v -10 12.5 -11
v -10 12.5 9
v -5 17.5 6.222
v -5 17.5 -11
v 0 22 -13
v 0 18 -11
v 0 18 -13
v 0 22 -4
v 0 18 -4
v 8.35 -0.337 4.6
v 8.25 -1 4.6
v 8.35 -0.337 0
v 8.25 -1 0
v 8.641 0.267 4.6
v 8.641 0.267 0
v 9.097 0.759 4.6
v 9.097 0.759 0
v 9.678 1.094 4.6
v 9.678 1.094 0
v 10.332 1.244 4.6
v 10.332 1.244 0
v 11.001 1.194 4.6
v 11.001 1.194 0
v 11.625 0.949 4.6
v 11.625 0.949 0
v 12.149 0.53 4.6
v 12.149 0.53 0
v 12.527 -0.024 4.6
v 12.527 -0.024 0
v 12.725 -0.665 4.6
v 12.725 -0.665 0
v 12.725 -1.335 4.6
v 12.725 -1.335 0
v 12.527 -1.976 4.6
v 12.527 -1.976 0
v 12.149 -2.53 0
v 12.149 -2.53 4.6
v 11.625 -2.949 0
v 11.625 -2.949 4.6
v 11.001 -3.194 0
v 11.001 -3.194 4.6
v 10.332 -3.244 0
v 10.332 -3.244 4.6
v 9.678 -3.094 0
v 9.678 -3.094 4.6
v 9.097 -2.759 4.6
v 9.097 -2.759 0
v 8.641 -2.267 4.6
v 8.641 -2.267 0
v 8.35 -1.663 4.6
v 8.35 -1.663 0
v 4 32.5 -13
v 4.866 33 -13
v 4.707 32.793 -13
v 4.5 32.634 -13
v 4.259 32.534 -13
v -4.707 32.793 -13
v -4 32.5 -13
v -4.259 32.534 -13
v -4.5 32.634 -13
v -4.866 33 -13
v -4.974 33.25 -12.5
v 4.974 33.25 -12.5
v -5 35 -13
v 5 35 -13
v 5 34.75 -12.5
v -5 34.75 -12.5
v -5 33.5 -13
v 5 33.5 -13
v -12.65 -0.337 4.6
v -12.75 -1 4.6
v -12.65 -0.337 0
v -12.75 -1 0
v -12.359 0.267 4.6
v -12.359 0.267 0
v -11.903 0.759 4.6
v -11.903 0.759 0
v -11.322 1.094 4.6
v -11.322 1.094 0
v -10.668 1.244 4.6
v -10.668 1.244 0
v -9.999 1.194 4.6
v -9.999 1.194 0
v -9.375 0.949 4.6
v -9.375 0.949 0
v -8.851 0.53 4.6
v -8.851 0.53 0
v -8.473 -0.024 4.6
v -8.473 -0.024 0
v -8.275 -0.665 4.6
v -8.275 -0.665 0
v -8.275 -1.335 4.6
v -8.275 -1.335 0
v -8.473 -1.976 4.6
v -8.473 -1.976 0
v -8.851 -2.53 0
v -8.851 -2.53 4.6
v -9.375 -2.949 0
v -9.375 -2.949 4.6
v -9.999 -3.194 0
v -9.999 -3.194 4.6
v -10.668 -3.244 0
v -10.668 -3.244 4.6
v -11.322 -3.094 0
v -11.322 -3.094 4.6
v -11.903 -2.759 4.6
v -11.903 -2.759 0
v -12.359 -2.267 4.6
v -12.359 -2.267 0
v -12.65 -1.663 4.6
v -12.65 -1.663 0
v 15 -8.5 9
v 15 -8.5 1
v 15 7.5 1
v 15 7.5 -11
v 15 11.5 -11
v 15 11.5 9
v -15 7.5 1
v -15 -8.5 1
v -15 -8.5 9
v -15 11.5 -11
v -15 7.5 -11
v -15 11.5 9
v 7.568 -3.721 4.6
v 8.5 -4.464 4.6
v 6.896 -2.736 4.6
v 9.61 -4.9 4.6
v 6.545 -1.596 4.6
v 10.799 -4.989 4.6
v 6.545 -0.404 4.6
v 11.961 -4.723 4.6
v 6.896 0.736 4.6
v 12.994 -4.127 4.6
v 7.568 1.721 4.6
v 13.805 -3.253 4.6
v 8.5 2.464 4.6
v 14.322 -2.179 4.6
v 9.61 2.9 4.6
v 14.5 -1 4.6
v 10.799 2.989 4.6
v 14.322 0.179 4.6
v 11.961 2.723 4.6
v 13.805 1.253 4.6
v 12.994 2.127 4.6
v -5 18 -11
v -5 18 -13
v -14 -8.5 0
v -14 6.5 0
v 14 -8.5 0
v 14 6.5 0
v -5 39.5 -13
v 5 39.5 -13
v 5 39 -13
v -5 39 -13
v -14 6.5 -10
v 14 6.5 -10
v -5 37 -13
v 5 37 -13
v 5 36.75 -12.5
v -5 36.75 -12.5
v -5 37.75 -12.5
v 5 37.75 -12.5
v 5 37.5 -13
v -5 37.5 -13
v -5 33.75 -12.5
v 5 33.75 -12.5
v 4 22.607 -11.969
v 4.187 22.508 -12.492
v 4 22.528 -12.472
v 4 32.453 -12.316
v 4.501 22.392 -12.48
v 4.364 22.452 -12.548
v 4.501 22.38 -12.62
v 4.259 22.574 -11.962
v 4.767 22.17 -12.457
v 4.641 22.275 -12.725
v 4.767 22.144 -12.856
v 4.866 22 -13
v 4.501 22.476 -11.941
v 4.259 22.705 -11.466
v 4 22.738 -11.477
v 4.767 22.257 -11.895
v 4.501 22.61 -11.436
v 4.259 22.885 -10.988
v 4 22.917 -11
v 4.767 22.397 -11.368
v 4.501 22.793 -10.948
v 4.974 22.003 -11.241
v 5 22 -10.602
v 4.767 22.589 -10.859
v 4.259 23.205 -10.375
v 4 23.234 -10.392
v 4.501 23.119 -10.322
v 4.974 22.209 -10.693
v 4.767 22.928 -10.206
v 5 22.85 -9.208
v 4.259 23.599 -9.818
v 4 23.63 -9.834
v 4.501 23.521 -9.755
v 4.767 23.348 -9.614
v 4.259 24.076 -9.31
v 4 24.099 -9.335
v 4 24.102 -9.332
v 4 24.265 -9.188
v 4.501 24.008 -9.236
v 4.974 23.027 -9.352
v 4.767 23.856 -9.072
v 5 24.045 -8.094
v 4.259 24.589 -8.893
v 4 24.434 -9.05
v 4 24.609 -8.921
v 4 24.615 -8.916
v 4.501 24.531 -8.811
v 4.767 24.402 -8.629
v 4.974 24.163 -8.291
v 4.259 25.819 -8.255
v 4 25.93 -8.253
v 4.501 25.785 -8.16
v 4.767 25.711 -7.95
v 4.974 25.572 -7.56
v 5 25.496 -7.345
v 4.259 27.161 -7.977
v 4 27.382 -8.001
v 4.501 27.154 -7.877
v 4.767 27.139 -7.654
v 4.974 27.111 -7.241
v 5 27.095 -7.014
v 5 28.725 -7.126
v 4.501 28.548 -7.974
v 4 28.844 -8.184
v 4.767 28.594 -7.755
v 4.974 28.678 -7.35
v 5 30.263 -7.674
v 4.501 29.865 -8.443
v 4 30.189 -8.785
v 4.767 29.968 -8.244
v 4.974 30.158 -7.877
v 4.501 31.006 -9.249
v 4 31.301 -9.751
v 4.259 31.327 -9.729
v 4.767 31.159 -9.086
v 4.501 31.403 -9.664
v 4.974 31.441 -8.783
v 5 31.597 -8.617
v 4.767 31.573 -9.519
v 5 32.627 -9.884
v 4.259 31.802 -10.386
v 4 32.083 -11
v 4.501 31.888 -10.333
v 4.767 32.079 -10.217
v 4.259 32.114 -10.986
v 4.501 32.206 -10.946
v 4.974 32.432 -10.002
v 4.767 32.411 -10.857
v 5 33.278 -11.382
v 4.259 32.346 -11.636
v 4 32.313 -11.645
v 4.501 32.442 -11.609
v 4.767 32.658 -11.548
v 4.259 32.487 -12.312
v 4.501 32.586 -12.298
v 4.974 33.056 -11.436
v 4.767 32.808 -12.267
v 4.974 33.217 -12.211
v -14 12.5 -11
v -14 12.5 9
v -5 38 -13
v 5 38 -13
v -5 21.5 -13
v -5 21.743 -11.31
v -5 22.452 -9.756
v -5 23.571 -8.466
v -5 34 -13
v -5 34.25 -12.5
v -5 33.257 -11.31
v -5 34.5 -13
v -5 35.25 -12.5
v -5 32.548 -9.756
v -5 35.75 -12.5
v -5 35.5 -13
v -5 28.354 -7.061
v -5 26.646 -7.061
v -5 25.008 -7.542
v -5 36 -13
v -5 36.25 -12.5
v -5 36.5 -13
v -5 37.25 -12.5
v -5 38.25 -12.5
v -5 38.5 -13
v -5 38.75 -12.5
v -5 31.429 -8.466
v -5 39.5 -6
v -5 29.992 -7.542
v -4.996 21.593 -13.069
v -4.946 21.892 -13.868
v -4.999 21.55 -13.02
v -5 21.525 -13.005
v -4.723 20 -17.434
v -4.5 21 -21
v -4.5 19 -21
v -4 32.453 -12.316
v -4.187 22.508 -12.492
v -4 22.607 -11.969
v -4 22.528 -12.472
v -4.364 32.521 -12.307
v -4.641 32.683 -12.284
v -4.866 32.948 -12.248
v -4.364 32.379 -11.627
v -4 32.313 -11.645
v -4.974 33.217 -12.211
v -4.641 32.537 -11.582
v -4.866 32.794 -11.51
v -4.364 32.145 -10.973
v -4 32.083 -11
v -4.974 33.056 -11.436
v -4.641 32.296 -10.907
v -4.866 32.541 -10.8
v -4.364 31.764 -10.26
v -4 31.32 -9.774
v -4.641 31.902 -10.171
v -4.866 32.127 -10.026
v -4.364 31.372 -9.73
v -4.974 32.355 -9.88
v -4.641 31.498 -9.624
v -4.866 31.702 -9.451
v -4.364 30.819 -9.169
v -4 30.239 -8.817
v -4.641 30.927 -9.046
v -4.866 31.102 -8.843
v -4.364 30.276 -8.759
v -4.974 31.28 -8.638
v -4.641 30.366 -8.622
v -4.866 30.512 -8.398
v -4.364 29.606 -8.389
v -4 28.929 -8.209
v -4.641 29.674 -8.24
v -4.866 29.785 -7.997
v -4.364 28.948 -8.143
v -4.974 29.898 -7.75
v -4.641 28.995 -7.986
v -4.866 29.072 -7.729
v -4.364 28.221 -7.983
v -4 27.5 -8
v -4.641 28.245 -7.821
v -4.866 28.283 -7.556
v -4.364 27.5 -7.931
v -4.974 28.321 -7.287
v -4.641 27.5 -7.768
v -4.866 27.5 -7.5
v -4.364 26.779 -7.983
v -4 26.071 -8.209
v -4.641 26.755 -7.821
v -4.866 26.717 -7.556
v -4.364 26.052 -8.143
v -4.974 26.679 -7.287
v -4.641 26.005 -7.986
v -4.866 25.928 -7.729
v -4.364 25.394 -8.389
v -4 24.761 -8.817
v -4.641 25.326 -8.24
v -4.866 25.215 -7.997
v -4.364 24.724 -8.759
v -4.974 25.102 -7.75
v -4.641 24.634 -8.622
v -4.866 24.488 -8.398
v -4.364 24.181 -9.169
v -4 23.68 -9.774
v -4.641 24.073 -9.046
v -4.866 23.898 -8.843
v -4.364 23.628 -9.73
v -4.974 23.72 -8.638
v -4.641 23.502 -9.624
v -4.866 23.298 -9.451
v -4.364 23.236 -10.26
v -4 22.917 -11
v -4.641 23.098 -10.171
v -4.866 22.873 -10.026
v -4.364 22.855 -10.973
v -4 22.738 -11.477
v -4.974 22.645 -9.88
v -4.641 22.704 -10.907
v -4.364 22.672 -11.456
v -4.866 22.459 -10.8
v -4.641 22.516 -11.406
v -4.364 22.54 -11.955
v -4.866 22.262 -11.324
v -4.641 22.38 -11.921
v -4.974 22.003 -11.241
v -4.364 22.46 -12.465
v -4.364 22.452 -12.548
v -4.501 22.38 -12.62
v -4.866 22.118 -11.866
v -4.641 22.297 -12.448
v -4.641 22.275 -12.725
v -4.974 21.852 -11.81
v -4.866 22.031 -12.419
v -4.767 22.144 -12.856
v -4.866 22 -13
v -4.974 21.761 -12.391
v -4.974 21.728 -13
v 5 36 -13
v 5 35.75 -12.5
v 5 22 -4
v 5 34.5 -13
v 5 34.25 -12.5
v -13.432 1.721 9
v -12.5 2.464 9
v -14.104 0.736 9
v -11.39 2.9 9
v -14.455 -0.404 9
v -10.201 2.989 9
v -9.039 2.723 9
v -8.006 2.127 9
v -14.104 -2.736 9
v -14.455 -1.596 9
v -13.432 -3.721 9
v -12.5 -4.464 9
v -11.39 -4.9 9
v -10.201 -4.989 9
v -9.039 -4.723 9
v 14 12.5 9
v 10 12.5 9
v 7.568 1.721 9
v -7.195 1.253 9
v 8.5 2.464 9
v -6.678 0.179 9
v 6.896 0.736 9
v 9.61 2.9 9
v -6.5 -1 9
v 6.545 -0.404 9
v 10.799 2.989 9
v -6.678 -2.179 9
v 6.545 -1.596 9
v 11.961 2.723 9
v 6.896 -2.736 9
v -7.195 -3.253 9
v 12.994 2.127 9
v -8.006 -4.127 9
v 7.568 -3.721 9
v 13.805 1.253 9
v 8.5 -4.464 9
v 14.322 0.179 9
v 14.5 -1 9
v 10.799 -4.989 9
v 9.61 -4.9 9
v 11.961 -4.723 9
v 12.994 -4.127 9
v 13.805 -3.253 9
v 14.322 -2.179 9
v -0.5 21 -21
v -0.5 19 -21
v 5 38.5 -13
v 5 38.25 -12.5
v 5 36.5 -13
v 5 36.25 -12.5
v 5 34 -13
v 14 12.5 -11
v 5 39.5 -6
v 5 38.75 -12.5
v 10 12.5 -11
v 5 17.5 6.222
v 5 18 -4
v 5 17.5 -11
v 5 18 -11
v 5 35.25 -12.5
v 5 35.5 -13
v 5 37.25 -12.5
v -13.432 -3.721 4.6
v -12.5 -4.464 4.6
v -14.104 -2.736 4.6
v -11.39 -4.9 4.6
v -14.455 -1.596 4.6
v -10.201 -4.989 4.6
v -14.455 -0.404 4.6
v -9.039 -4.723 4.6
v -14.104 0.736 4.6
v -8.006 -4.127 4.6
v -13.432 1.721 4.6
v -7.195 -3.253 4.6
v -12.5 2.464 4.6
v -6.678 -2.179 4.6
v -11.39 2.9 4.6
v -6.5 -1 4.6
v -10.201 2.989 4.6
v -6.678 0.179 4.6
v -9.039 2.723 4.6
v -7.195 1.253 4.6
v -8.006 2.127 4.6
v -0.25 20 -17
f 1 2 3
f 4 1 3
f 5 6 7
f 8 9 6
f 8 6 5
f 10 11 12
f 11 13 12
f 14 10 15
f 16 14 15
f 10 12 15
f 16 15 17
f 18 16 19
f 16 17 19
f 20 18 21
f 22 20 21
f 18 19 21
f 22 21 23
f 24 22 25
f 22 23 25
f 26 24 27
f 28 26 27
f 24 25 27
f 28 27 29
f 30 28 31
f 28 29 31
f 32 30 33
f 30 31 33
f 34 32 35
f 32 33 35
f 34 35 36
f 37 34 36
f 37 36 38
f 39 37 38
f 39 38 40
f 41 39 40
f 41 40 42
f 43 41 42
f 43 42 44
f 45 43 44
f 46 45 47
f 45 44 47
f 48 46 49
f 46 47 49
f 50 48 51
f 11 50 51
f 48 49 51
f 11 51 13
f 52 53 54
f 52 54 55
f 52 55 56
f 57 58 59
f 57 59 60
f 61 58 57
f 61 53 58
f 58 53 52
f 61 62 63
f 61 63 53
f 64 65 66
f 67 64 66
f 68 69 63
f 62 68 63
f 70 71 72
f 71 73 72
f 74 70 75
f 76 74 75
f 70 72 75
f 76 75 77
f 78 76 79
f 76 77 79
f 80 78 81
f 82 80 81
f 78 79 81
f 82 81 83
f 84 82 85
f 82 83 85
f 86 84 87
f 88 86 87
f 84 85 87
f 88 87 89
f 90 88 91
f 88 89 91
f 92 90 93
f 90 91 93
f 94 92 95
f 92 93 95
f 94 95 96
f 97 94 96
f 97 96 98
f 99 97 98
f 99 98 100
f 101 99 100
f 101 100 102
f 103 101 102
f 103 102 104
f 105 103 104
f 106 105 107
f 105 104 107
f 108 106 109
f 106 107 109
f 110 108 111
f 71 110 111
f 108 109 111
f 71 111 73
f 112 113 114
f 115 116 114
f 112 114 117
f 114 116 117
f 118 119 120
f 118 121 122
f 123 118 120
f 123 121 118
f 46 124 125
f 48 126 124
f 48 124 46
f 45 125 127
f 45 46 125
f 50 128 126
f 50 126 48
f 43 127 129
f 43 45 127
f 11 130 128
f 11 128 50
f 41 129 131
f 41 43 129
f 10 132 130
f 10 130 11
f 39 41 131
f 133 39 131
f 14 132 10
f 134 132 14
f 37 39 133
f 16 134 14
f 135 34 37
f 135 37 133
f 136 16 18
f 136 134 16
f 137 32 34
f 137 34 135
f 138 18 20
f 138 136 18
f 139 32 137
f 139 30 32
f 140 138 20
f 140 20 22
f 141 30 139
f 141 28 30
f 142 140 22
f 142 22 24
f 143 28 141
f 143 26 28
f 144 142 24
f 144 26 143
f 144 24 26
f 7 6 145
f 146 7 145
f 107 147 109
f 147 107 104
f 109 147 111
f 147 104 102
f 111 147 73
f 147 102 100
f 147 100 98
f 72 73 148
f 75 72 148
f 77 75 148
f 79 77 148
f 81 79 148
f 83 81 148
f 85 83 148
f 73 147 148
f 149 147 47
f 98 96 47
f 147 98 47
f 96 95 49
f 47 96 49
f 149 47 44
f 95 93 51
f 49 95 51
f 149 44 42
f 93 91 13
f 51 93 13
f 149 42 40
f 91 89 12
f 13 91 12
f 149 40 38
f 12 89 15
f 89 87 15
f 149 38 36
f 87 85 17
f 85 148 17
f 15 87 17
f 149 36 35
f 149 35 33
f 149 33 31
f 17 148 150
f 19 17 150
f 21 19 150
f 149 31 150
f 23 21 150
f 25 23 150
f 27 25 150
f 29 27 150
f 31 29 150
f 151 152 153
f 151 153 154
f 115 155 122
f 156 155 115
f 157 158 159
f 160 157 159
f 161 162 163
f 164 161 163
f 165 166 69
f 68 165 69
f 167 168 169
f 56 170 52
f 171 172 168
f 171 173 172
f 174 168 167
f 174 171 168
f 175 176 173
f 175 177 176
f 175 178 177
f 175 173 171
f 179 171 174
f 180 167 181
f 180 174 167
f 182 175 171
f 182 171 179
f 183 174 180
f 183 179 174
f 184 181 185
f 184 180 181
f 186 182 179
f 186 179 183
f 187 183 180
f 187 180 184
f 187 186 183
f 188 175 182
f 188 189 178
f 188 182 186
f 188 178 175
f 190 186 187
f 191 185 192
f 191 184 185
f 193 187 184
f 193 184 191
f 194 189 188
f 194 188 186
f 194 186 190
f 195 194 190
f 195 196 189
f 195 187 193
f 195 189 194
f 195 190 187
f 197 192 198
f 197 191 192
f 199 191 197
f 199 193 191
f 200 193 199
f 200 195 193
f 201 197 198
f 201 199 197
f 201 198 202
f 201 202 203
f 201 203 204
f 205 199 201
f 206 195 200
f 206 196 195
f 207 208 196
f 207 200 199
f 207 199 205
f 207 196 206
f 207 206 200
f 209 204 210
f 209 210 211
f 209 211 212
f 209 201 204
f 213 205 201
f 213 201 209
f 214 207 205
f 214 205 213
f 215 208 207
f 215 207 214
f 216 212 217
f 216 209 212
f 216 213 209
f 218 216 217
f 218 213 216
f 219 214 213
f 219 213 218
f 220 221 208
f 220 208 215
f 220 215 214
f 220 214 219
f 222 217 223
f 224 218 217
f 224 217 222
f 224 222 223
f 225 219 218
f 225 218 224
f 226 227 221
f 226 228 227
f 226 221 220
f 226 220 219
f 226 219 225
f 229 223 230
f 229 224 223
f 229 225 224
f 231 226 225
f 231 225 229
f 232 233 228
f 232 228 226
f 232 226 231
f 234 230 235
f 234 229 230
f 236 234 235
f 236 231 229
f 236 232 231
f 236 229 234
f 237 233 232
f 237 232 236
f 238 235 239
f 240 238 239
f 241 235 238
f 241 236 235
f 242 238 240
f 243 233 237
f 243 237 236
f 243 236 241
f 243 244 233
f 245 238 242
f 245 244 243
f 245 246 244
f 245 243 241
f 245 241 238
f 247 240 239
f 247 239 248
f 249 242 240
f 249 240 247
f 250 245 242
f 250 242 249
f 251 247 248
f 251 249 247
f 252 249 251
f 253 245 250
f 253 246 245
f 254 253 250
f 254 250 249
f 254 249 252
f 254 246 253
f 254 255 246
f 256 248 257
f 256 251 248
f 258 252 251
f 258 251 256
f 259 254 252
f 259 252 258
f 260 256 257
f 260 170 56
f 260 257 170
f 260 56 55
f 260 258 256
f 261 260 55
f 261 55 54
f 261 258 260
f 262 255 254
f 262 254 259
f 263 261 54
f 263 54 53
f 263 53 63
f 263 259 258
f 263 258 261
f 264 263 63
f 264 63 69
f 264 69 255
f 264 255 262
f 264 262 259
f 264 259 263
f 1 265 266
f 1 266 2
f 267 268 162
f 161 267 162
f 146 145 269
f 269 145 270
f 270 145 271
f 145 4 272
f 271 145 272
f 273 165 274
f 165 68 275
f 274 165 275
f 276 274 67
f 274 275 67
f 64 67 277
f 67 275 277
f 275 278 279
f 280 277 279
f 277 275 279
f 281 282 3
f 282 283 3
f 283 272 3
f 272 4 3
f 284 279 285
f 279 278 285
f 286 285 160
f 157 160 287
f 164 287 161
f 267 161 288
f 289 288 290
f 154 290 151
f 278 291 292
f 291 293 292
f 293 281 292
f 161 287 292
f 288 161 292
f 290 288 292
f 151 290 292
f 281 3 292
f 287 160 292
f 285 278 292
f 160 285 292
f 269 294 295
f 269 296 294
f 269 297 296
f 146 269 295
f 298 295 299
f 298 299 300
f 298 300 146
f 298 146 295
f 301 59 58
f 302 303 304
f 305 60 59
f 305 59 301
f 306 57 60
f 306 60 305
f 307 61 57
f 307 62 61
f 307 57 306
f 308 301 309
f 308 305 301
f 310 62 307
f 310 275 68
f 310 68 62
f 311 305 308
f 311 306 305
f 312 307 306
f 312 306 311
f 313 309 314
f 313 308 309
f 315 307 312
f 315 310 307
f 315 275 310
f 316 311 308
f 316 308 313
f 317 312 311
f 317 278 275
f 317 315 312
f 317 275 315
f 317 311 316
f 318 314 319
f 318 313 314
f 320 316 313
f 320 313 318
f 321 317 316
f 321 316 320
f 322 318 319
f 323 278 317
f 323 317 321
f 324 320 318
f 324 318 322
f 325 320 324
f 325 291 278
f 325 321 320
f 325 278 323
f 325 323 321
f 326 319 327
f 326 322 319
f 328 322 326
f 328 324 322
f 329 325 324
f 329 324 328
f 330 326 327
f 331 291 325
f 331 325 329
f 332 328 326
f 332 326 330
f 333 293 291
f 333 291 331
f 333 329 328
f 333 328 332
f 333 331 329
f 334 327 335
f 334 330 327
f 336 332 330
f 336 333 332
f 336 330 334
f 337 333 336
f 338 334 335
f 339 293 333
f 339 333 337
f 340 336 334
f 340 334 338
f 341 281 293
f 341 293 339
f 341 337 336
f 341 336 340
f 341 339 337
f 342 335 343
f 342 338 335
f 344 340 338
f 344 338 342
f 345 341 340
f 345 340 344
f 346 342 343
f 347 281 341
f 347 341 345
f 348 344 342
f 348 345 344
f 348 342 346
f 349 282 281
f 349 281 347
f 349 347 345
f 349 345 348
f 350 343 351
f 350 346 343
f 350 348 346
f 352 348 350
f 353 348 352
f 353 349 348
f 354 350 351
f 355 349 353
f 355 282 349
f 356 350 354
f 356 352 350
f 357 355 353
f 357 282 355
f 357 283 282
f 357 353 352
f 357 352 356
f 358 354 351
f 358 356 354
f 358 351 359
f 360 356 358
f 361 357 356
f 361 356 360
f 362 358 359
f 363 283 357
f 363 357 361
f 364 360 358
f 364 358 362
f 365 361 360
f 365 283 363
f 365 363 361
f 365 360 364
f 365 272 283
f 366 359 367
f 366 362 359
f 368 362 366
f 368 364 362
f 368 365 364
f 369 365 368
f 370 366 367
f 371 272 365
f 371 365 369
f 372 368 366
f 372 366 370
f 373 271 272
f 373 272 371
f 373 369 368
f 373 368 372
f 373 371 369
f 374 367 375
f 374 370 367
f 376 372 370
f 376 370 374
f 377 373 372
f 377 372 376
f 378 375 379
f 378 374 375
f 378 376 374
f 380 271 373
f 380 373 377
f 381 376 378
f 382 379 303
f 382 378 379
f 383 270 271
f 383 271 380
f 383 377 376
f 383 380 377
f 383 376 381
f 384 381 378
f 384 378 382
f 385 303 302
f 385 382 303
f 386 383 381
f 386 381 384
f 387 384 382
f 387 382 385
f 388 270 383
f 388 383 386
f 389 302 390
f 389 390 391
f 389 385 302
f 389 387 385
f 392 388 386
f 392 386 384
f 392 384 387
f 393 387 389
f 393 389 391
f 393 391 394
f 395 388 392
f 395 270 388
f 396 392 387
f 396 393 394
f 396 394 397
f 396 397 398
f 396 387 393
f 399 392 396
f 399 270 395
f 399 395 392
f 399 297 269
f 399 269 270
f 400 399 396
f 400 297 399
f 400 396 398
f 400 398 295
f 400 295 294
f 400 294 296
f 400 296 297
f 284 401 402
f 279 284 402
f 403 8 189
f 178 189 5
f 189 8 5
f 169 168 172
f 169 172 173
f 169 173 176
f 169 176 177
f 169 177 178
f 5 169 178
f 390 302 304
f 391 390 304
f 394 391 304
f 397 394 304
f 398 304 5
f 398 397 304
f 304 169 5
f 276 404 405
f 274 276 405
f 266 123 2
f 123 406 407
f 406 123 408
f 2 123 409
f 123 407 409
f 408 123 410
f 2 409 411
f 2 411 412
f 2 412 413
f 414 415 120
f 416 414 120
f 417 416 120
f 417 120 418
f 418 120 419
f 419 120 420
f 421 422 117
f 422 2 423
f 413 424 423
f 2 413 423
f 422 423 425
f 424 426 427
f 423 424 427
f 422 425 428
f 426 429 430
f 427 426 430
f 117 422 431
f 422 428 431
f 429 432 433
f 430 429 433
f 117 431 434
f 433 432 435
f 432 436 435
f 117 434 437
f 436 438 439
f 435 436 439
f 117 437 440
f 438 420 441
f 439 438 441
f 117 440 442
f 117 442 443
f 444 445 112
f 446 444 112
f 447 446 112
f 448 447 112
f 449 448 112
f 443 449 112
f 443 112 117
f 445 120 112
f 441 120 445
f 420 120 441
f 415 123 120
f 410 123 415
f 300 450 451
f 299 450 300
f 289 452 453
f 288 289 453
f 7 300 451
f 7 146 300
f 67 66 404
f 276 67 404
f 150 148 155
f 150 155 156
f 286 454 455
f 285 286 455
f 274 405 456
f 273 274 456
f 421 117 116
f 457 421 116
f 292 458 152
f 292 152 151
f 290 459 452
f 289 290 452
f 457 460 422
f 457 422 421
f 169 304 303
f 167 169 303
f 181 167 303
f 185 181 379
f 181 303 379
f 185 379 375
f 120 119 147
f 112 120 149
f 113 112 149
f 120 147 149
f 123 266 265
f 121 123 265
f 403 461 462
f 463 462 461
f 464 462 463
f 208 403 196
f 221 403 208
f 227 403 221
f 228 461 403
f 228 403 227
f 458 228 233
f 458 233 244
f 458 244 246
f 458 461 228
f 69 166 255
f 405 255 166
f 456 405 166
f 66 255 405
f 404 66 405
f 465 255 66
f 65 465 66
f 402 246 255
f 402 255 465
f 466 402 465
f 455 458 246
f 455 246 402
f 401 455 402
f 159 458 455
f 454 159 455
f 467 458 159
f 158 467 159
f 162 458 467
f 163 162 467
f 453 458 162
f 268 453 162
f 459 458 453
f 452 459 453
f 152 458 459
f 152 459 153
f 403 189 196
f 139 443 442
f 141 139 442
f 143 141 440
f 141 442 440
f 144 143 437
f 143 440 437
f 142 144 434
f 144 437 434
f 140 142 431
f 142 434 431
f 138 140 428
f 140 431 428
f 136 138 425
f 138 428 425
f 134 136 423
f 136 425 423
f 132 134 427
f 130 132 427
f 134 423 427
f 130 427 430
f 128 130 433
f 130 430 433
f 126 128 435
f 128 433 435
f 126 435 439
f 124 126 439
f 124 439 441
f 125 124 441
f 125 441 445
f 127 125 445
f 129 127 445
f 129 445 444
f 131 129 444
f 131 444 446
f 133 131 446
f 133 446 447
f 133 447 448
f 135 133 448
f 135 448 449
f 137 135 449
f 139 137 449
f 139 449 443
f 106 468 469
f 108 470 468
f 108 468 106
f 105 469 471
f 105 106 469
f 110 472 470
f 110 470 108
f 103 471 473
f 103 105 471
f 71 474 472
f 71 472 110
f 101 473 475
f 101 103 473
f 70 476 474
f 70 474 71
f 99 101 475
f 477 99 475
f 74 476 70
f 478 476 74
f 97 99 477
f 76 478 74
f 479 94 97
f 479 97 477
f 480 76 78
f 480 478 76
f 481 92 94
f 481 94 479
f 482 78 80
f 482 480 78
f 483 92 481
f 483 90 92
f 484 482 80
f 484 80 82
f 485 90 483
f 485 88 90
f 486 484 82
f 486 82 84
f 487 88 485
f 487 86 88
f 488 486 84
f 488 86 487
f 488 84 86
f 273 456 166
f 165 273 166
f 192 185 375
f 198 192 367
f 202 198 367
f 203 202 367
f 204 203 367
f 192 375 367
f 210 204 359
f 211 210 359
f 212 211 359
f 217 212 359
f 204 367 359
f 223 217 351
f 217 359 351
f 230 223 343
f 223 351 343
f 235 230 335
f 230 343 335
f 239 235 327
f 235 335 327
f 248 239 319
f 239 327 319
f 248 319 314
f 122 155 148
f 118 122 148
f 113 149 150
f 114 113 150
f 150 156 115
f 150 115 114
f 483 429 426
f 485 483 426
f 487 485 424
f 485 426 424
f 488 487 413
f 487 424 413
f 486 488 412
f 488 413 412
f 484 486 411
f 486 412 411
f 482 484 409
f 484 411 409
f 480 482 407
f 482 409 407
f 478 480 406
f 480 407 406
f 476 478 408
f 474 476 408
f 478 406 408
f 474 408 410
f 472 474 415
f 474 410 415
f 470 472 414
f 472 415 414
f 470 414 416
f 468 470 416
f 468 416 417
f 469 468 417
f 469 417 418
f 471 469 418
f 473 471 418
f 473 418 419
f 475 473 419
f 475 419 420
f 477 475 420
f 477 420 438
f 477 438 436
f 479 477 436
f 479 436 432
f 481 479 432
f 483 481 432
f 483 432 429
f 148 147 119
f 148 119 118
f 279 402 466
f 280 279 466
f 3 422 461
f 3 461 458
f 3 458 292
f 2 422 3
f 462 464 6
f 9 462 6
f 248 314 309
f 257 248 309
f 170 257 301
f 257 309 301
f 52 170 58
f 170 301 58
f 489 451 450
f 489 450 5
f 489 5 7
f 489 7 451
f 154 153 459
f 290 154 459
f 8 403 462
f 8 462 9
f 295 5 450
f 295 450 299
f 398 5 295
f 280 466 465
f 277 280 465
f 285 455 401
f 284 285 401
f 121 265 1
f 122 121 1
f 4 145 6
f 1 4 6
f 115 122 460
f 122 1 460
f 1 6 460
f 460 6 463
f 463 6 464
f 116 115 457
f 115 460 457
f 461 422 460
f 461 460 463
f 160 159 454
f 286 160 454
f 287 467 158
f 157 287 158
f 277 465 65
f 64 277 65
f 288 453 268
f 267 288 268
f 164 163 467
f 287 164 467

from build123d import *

# Parameters (mm, degrees)
AUFSATZ_LINEAR_AUSTRAGEN1_OUTLINE_W                  = 30
AUFSATZ_LINEAR_AUSTRAGEN1_OUTLINE_H                  = 17
AUFSATZ_LINEAR_AUSTRAGEN1_DEPTH                      = 9
SKIZZE3_W                                            = 30
SKIZZE3_H                                            = 20
AUFSATZ_LINEAR_AUSTRAGEN2_DEPTH                      = 4
FASE1_SIZE                                           = 5
SKIZZE7_W                                            = 10
SKIZZE7_H                                            = 7
AUFSATZ_LINEAR_AUSTRAGEN3_DEPTH                      = 2
SCHNITT_LINEAR_AUSTRAGEN1_DEPTH                      = 45.206900067
LINEARES_MUSTER1_COUNT                               = 12
LINEARES_MUSTER1_PITCH                               = 0.5
AUFSATZ_LINEAR_START                                 = -5
AUFSATZ_LINEAR_AUSTRAGEN4_DEPTH                      = 10
SCHNITT_LINEAR_AUSTRAGEN2_DEPTH                      = 45.206900067
SCHNITT_LINEAR_AUSTRAGEN2_DEPTH_BACK                 = 45.206900067
SKIZZE10_W                                           = 5
SKIZZE10_H                                           = 4
AUFSATZ_LINEAR_AUSTRAGEN5_DEPTH                      = 2
SKIZZE13_W                                           = 5
SKIZZE13_H                                           = 4
SCHNITT_LINEAR_AUSTRAGEN3_DEPTH                      = 9
FASE2_SIZE                                           = 0.5
VERRUNDUNG1_R                                        = 1
STIRNSENKUNG_F_R_M4_ZYLINDERSCHRAUBE_MIT_D           = 4.5
STIRNSENKUNG_F_R_M4_ZYLINDERSCHRAUBE_MIT_CBORE_D     = 8
STIRNSENKUNG_F_R_M4_ZYLINDERSCHRAUBE_MIT_CBORE_DEPTH = 4.4
SKIZZE18_W                                           = 30
SKIZZE18_H                                           = 11
AUFSATZ_LINEAR_AUSTRAGEN6_DEPTH                      = 2
FASE3_SIZE                                           = 1


with BuildPart() as part:
    # Aufsatz-Linear austragen1: read off the stored shape, not the designer's step
    # Aufsatz-Linear austragen1 outline → Aufsatz-Linear austragen1 (new body)
    with BuildSketch(Plane.XY):
        Rectangle(AUFSATZ_LINEAR_AUSTRAGEN1_OUTLINE_W, AUFSATZ_LINEAR_AUSTRAGEN1_OUTLINE_H)
    extrude(amount=AUFSATZ_LINEAR_AUSTRAGEN1_DEPTH)

    # Skizze3 → Aufsatz-Linear austragen2 (add)
    with BuildSketch(Plane(origin=(0, 8.5, 0), x_dir=(1, 0, 0), z_dir=(0, 1, 0))):
        with Locations((0, 1)):
            Rectangle(SKIZZE3_W, SKIZZE3_H)
    extrude(amount=AUFSATZ_LINEAR_AUSTRAGEN2_DEPTH)

    # Skizze4 → Ausformung1 section 0
    with BuildSketch(Plane(origin=(0, 39.5, 0), x_dir=(1, 0, 0), z_dir=(0, 1, 0))):
        with BuildLine():
            Line((-5, 11), (5, 11))
            Line((5, 11), (5, 6))
            Line((5, 6), (-5, 6))
            Line((-5, 6), (-5, 11))
        make_face()
    # Skizze5 → Ausformung1 section 1
    with BuildSketch(Plane(origin=(0, 12.5, 0), x_dir=(1, 0, 0), z_dir=(0, 1, 0))):
        with BuildLine():
            Line((-5, 11), (5, 11))
            Line((5, 11), (5, -9))
            Line((5, -9), (-5, -9))
            Line((-5, -9), (-5, 11))
        make_face()
    loft()

    # Fase1
    fase1_edges = [part.edges().sort_by_distance(p)[0] for p in [
        (5, 12.5, -1),
        (-5, 12.5, -1),
    ]]
    chamfer(fase1_edges, length=FASE1_SIZE)

    # Skizze7 → Aufsatz-Linear austragen3 (add)
    with BuildSketch(Plane(origin=(0, 0, -11), x_dir=(-1, 0, 0), z_dir=(0, 0, -1))):
        with Locations((0, 36)):
            Rectangle(SKIZZE7_W, SKIZZE7_H)
    extrude(amount=AUFSATZ_LINEAR_AUSTRAGEN3_DEPTH)

    # Skizze6 → Schnitt-Linear austragen1 (cut, symmetric)
    with BuildSketch(Plane(origin=(0, 0, 0), x_dir=(0, 0, -1), z_dir=(1, 0, 0))):
        Polygon((13, 39), (12.5, 38.75), (13, 38.5), align=None)
    schnitt_linear_austragen1 = extrude(amount=SCHNITT_LINEAR_AUSTRAGEN1_DEPTH, both=True, mode=Mode.SUBTRACT)

    # Lineares Muster1: Schnitt-Linear austragen1 ×12
    with Locations(*[(0, -i * LINEARES_MUSTER1_PITCH, 0) for i in range(1, LINEARES_MUSTER1_COUNT)]):
        add(schnitt_linear_austragen1, mode=Mode.SUBTRACT)

    # Skizze8 → Aufsatz-Linear austragen4 (add)
    with BuildSketch(Plane(origin=(0, 0, 0), x_dir=(0, 0, -1), z_dir=(1, 0, 0)).offset(AUFSATZ_LINEAR_START)):
        with BuildLine():
            ThreePointArc((11, 32.082575695), (11.978451782, 32.394531565), (13, 32.5))
            Line((13, 32.5), (11, 32.5))
            Line((11, 32.5), (11, 32.082575695))
        make_face()
        with BuildLine():
            Line((11, 22.917424305), (11, 22))
            Line((11, 22), (13, 22))
            Line((13, 22), (13, 22.5))
            ThreePointArc((13, 22.5), (11.978451782, 22.605468435), (11, 22.917424305))
        make_face()
    extrude(amount=AUFSATZ_LINEAR_AUSTRAGEN4_DEPTH)

    # Skizze9 → Schnitt-Linear austragen2 (cut, two sides: drawn at the far end of the back side and taken through both)
    with BuildSketch(Plane(origin=(0, 0, 0), x_dir=(0, 0, -1), z_dir=(1, 0, 0)).offset(-SCHNITT_LINEAR_AUSTRAGEN2_DEPTH_BACK)):
        with BuildLine():
            Line((11, 32.082575695), (11, 22.917424305))
            ThreePointArc((11, 22.917424305), (8, 27.5), (11, 32.082575695))
        make_face()
    extrude(amount=SCHNITT_LINEAR_AUSTRAGEN2_DEPTH + SCHNITT_LINEAR_AUSTRAGEN2_DEPTH_BACK, mode=Mode.SUBTRACT)

    # Skizze10 → Aufsatz-Linear austragen5 (add)
    with BuildSketch(Plane(origin=(0, 0, -11), x_dir=(-1, 0, 0), z_dir=(0, 0, -1))):
        with Locations((2.5, 20)):
            Rectangle(SKIZZE10_W, SKIZZE10_H)
    extrude(amount=AUFSATZ_LINEAR_AUSTRAGEN5_DEPTH)

    # Skizze12 → Ausformung2 section 0
    with BuildSketch(Plane(origin=(0, 0, -21), x_dir=(-1, 0, 0), z_dir=(0, 0, -1))):
        with BuildLine():
            Line((0.5, 21), (4.5, 21))
            Line((4.5, 21), (4.5, 19))
            Line((4.5, 19), (0.5, 19))
            Line((0.5, 19), (0.5, 21))
        make_face()
    # Skizze11 → Ausformung2 section 1
    with BuildSketch(Plane(origin=(0, 0, -13), x_dir=(-1, 0, 0), z_dir=(0, 0, -1))):
        with BuildLine():
            Line((0, 18), (5, 18))
            Line((5, 18), (5, 22))
            Line((5, 22), (0, 22))
            Line((0, 22), (0, 18))
        make_face()
    loft()

    # Skizze13 → Schnitt-Linear austragen3 (cut)
    with BuildSketch(Plane(origin=(0, 0, -13), x_dir=(-1, 0, 0), z_dir=(0, 0, -1))):
        with Locations((-2.5, 20)):
            Rectangle(SKIZZE13_W, SKIZZE13_H)
    extrude(amount=-SCHNITT_LINEAR_AUSTRAGEN3_DEPTH, mode=Mode.SUBTRACT)

    # Fase2
    # the kernel refuses this chamfer: 0.5 mm, written as the material it takes off along each edge
    with BuildSketch(Plane(origin=(-6.359313388, 22.5, -13), x_dir=(0, 0.05286907949936605, 0.9986014522485384), z_dir=(1, 0, 0))) as fase2_piece_1:
        with BuildLine():
            Line((0.528690795, 0), (-FASE2_SIZE * 0.0528690794994, FASE2_SIZE * 0.998601452249))
            Line((-FASE2_SIZE * 0.0528690794994, FASE2_SIZE * 0.998601452249), (0, 0))
            ThreePointArc((0, 0), (0.271800807, 0.00698718), (0.528690795, 0))
        make_face()
    extrude(amount=12.718626777, mode=Mode.SUBTRACT)

    # Verrundung1
    # the kernel refuses this fillet: 1 mm, written as the material it takes off along each edge
    with BuildSketch(Plane(origin=(5, 27.5, -13), x_dir=(0, -0.9230106794344456, -0.38477433080958384), z_dir=(0, 0.38477433080958384, -0.9230106794344456))) as verrundung1_piece_1:
        with BuildLine():
            CenterArc((5 + VERRUNDUNG1_R, VERRUNDUNG1_R), VERRUNDUNG1_R, 180, 90)
            Line((5, VERRUNDUNG1_R), (5, 0))
            Line((5, 0), (5 + VERRUNDUNG1_R, 0))
        make_face()
    revolve(axis=Axis((5, 27.5, -13), (-1, 0, 0)), revolution_arc=231.320638443, mode=Mode.SUBTRACT)
    with BuildSketch(Plane(origin=(-5, 27.5, -13), x_dir=(0, 0.8772223630986392, -0.4800842901820881), z_dir=(0, -0.4800842901820881, -0.8772223630986392))) as verrundung1_piece_2:
        with BuildLine():
            CenterArc((5 + VERRUNDUNG1_R, VERRUNDUNG1_R), VERRUNDUNG1_R, 180, 90)
            Line((5, VERRUNDUNG1_R), (5, 0))
            Line((5, 0), (5 + VERRUNDUNG1_R, 0))
        make_face()
    revolve(axis=Axis((-5, 27.5, -13), (1, 0, 0)), revolution_arc=231.320638443, mode=Mode.SUBTRACT)

    # Stirnsenkung für M4 Zylinderschraube mit Innensechskant1 (through all)
    with Locations(Plane.XY.offset(9)):
        with Locations((-10.5, -1), (10.5, -1)):
            CounterBoreHole(STIRNSENKUNG_F_R_M4_ZYLINDERSCHRAUBE_MIT_D / 2, STIRNSENKUNG_F_R_M4_ZYLINDERSCHRAUBE_MIT_CBORE_D / 2, STIRNSENKUNG_F_R_M4_ZYLINDERSCHRAUBE_MIT_CBORE_DEPTH)

    # Skizze18 → Aufsatz-Linear austragen6 (add)
    with BuildSketch(Plane.XZ.offset(-8.5)):
        with Locations((0, -5.5)):
            Rectangle(SKIZZE18_W, SKIZZE18_H)
    extrude(amount=AUFSATZ_LINEAR_AUSTRAGEN6_DEPTH)

    # Fase3
    fase3_edges = [part.edges().sort_by_distance(p)[0] for p in [
        (-15, -1, 0),
        (15, -1, 0),
        (15, 6.5, -5.5),
        (-15, 6.5, -5.5),
        (0, 6.5, -11),
        (15, 12.5, -1),
        (-15, 12.5, -1),
    ]]
    chamfer(fase3_edges, length=FASE3_SIZE)


solid = part.part
